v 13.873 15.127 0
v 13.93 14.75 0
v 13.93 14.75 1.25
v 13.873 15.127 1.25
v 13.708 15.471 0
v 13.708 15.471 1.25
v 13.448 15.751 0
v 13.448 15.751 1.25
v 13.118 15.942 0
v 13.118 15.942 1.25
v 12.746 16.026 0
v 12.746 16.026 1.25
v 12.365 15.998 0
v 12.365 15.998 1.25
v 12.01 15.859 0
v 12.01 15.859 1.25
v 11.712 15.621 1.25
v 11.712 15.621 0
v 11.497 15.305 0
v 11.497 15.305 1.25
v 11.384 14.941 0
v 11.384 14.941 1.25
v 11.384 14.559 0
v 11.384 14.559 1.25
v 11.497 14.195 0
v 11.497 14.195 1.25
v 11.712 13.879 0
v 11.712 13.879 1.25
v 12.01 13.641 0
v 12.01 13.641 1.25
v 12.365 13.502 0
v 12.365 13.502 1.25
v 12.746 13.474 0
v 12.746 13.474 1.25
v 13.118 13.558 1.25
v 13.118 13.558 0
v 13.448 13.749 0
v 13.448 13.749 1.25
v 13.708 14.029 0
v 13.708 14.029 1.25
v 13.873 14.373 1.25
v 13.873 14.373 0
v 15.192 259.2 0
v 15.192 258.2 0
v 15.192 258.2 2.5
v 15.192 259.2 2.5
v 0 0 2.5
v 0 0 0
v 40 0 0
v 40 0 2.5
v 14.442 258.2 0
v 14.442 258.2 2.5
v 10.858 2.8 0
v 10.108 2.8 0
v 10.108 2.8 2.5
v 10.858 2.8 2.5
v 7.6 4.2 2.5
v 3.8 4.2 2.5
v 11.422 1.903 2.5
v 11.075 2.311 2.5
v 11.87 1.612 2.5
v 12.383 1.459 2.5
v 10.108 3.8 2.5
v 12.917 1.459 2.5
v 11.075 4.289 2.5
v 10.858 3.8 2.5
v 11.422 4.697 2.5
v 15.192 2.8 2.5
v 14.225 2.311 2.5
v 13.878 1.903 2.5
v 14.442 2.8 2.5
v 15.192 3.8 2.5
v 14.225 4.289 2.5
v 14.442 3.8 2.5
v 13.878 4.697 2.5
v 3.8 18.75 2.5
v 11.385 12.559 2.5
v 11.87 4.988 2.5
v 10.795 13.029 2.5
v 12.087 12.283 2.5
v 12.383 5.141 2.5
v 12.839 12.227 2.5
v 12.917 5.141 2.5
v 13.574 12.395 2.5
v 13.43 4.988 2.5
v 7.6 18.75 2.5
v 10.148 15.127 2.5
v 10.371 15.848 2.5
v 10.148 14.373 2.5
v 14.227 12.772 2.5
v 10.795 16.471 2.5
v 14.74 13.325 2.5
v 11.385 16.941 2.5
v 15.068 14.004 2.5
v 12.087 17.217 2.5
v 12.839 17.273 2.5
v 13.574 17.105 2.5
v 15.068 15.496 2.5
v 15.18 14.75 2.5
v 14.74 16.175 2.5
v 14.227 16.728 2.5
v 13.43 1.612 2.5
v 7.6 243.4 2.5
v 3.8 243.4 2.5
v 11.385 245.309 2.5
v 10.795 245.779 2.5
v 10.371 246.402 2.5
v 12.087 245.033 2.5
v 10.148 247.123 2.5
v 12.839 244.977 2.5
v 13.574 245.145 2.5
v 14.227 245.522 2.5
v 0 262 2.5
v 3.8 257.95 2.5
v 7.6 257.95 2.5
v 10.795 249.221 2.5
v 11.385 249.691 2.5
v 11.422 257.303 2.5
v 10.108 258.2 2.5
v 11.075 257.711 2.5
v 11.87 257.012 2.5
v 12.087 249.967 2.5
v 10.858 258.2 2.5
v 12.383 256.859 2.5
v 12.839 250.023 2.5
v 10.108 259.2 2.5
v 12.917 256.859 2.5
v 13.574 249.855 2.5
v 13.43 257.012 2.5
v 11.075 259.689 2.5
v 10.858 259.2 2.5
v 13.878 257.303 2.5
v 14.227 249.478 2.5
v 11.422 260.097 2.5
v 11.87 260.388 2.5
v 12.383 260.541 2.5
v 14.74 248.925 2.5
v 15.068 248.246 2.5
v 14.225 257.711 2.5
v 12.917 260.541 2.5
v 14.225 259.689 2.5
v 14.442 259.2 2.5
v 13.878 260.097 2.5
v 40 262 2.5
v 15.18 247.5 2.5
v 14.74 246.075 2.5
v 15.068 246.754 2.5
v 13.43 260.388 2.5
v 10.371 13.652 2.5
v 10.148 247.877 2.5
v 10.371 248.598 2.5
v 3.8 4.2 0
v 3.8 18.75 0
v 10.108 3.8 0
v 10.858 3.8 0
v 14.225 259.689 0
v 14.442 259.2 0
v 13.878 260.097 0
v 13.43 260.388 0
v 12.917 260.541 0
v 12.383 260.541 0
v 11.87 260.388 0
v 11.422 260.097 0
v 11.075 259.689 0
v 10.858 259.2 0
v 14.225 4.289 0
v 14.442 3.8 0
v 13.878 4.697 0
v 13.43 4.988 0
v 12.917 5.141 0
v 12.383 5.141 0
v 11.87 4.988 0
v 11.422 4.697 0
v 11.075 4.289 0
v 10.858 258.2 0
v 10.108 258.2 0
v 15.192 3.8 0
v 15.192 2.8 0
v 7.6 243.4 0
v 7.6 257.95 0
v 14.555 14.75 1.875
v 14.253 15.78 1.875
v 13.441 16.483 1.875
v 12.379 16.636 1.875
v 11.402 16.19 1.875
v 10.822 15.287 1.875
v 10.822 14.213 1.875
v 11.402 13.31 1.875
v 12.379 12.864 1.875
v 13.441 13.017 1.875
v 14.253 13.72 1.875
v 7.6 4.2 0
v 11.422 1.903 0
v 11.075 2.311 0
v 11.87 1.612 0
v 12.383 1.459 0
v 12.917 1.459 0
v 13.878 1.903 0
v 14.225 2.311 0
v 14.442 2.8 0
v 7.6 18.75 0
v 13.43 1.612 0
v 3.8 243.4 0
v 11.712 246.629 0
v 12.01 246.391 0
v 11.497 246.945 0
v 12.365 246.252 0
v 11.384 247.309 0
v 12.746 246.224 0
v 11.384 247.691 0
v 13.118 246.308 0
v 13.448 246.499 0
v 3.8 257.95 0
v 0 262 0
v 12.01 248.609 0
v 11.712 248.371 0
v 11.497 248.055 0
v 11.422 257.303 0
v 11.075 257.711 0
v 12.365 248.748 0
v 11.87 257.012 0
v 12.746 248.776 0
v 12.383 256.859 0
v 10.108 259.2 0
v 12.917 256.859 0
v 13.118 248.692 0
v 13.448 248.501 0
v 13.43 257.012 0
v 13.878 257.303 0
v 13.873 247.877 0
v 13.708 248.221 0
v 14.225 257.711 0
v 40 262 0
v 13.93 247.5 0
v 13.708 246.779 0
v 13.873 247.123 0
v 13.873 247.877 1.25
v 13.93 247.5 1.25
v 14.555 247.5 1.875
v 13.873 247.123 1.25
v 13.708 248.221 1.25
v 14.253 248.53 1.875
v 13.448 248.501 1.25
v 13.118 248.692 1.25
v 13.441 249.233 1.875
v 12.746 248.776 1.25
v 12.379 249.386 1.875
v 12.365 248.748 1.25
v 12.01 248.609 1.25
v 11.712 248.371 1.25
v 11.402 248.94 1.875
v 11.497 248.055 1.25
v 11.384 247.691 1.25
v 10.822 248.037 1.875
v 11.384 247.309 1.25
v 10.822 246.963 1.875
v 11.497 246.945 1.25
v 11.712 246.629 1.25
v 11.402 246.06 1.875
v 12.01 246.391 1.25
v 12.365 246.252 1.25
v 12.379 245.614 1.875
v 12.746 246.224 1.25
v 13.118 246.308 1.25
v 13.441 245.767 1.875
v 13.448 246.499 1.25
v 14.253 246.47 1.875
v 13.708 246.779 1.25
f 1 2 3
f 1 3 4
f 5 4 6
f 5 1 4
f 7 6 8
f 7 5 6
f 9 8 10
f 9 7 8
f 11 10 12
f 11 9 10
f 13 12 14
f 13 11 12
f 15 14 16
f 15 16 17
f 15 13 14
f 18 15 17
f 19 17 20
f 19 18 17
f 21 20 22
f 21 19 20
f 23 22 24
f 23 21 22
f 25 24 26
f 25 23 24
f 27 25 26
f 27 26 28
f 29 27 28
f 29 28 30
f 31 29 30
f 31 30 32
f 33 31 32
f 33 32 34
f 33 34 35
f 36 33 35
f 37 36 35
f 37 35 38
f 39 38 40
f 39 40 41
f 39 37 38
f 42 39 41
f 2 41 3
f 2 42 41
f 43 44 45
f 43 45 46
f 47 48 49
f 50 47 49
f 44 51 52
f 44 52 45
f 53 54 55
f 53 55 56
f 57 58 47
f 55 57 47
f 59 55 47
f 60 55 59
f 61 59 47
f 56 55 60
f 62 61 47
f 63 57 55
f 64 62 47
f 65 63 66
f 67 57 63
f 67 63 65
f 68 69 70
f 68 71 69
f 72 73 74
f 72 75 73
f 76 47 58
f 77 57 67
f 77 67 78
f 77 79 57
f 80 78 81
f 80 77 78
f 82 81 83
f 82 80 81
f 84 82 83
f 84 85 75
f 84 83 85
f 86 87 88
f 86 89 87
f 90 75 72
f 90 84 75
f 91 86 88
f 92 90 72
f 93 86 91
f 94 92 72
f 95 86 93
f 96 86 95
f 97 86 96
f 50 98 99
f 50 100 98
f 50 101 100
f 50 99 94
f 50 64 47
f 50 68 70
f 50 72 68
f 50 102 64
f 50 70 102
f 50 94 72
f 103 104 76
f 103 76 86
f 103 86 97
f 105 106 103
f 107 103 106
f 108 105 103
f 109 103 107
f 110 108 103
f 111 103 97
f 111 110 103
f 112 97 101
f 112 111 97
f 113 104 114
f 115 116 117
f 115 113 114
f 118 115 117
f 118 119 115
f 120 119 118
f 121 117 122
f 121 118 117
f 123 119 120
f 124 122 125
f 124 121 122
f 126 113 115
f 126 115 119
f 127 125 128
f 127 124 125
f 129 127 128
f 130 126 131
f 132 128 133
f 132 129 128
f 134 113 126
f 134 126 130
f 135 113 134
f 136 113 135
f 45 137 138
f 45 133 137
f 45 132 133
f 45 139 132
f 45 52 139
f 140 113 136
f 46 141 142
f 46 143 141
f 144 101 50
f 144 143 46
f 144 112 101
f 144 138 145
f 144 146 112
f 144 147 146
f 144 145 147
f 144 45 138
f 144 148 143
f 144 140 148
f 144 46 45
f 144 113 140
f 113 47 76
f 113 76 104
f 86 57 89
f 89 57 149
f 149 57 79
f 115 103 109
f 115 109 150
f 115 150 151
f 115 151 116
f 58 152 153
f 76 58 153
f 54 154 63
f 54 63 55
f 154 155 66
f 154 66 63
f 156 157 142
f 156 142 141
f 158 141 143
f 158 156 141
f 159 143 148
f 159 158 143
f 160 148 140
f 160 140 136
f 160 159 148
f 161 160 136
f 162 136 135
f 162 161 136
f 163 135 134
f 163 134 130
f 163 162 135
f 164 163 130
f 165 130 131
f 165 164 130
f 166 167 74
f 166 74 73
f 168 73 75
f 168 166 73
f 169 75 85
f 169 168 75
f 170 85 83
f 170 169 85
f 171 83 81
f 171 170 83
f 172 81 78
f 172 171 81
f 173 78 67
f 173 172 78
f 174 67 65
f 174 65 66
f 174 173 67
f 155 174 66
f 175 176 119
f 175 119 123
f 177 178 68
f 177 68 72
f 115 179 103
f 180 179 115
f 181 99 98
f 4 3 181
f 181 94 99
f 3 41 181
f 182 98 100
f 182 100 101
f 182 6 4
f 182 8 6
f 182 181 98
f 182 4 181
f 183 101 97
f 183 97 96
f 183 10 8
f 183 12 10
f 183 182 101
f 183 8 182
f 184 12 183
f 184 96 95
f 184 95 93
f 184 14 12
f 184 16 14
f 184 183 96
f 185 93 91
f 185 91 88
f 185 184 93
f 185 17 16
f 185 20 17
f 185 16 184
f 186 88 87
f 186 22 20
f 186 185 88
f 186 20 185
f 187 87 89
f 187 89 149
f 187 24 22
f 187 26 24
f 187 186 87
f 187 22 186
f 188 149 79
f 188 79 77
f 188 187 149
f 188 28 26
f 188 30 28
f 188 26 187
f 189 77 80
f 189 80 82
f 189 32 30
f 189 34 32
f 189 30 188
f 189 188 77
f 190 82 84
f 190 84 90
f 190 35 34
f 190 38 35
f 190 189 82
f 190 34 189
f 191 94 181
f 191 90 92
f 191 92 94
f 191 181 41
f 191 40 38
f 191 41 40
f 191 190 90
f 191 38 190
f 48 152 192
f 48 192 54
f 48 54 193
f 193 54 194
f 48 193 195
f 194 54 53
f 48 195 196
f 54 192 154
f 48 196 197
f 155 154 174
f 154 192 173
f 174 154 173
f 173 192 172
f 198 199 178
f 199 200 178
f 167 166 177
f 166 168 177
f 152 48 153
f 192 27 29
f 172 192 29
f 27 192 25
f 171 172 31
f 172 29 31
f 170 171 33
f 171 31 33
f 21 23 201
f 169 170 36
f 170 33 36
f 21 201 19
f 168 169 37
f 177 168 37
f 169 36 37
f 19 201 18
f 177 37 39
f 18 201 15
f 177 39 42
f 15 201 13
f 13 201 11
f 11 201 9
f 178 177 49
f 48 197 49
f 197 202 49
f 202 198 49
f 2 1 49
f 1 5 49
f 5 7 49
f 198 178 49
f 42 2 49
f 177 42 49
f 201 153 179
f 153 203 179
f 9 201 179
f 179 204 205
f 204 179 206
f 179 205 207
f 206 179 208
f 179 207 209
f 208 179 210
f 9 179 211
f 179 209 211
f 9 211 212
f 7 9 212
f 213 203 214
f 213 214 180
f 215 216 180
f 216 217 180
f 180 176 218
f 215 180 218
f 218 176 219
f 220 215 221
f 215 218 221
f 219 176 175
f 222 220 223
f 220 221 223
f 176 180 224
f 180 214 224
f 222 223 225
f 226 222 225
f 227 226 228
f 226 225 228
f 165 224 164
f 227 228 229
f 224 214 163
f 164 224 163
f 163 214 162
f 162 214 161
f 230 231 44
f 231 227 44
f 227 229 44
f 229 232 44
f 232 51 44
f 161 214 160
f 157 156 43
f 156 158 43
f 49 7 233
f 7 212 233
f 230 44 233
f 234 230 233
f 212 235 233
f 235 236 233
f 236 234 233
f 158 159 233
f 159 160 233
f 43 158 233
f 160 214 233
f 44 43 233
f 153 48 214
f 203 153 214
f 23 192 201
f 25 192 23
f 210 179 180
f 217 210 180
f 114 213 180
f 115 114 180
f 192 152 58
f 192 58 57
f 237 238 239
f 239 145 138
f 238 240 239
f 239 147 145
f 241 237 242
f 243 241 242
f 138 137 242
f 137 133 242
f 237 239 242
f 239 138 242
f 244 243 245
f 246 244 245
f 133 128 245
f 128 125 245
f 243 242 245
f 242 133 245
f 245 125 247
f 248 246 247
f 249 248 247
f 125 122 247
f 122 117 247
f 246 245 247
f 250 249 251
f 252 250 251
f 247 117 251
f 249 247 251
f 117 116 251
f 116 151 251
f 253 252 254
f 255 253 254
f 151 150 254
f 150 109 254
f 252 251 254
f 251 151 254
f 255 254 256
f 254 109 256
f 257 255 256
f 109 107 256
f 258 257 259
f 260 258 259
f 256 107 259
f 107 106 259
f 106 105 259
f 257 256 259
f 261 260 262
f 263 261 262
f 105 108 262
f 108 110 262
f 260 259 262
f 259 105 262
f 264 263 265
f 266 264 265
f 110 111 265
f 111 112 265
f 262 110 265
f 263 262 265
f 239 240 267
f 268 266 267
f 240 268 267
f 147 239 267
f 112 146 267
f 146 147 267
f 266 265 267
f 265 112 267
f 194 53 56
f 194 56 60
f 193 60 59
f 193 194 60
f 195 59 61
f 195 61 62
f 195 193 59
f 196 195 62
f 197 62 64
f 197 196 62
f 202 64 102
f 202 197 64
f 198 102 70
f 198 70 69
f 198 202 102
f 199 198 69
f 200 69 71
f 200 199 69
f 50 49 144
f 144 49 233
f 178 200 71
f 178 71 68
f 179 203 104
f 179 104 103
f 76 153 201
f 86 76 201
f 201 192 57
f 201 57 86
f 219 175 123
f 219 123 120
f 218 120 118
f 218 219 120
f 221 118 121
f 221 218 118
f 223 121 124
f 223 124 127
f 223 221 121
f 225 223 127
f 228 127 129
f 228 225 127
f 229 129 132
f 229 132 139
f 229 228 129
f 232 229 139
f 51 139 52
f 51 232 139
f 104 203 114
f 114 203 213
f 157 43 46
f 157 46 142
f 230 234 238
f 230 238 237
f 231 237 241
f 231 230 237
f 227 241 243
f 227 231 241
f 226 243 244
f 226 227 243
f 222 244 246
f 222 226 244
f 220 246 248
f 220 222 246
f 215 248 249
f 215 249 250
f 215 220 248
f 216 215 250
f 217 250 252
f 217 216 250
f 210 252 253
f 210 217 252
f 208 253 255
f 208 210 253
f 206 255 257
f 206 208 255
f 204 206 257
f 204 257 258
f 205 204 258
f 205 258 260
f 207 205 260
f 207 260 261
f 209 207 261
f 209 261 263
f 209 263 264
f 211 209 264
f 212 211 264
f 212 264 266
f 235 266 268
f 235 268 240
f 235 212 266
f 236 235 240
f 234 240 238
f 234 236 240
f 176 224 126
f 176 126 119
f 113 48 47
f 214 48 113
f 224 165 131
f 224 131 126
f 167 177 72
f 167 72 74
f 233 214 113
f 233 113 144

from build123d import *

# Parameters (mm, degrees)
SKETCH1_W           = 40
SKETCH1_H           = 262
SKETCH1_R           = 1.28
SKETCH1_W_2         = 3.8
SKETCH1_H_2         = 14.55
BOSS_EXTRUDE1_DEPTH = 2.5
CHAMFER1_SIZE       = 1.25
CHAMFER2_SIZE       = 1.25


with BuildPart() as part:
    # Sketch1 → Boss-Extrude1 (new body)
    with BuildSketch(Plane.XY):
        with Locations((20, 131)):
            Rectangle(SKETCH1_W, SKETCH1_H)
        with Locations((12.65, 247.5)):
            Circle(SKETCH1_R, mode=Mode.SUBTRACT)
        with Locations((12.65, 14.75)):
            Circle(SKETCH1_R, mode=Mode.SUBTRACT)
        with Locations((5.7, 250.675)):
            Rectangle(SKETCH1_W_2, SKETCH1_H_2, mode=Mode.SUBTRACT)
        with Locations((5.7, 11.475)):
            Rectangle(SKETCH1_W_2, SKETCH1_H_2, mode=Mode.SUBTRACT)
        with BuildLine():
            Line((10.858464346, 3.8), (10.108464346, 3.8))
            Line((10.108464346, 3.8), (10.108464346, 2.8))
            Line((10.108464346, 2.8), (10.858464346, 2.8))
            ThreePointArc((10.858464346, 2.8), (12.65, 1.44), (14.441535654, 2.8))
            Line((14.441535654, 2.8), (15.191535654, 2.8))
            Line((15.191535654, 2.8), (15.191535654, 3.8))
            Line((15.191535654, 3.8), (14.441535654, 3.8))
            ThreePointArc((14.441535654, 3.8), (12.65, 5.16), (10.858464346, 3.8))
        make_face(mode=Mode.SUBTRACT)
        with BuildLine():
            Line((10.858464346, 259.2), (10.108464346, 259.2))
            Line((10.108464346, 259.2), (10.108464346, 258.2))
            Line((10.108464346, 258.2), (10.858464346, 258.2))
            ThreePointArc((10.858464346, 258.2), (12.65, 256.84), (14.441535654, 258.2))
            Line((14.441535654, 258.2), (15.191535654, 258.2))
            Line((15.191535654, 258.2), (15.191535654, 259.2))
            Line((15.191535654, 259.2), (14.441535654, 259.2))
            ThreePointArc((14.441535654, 259.2), (12.65, 260.56), (10.858464346, 259.2))
        make_face(mode=Mode.SUBTRACT)
    extrude(amount=BOSS_EXTRUDE1_DEPTH)

    # Chamfer1
    chamfer1_edges = [part.edges().sort_by_distance(p)[0] for p in [
        (11.37, 247.5, 2.5),
    ]]
    chamfer(chamfer1_edges, length=CHAMFER1_SIZE)

    # Chamfer2
    chamfer2_edges = [part.edges().sort_by_distance(p)[0] for p in [
        (11.37, 14.75, 2.5),
    ]]
    chamfer(chamfer2_edges, length=CHAMFER2_SIZE)


solid = part.part
